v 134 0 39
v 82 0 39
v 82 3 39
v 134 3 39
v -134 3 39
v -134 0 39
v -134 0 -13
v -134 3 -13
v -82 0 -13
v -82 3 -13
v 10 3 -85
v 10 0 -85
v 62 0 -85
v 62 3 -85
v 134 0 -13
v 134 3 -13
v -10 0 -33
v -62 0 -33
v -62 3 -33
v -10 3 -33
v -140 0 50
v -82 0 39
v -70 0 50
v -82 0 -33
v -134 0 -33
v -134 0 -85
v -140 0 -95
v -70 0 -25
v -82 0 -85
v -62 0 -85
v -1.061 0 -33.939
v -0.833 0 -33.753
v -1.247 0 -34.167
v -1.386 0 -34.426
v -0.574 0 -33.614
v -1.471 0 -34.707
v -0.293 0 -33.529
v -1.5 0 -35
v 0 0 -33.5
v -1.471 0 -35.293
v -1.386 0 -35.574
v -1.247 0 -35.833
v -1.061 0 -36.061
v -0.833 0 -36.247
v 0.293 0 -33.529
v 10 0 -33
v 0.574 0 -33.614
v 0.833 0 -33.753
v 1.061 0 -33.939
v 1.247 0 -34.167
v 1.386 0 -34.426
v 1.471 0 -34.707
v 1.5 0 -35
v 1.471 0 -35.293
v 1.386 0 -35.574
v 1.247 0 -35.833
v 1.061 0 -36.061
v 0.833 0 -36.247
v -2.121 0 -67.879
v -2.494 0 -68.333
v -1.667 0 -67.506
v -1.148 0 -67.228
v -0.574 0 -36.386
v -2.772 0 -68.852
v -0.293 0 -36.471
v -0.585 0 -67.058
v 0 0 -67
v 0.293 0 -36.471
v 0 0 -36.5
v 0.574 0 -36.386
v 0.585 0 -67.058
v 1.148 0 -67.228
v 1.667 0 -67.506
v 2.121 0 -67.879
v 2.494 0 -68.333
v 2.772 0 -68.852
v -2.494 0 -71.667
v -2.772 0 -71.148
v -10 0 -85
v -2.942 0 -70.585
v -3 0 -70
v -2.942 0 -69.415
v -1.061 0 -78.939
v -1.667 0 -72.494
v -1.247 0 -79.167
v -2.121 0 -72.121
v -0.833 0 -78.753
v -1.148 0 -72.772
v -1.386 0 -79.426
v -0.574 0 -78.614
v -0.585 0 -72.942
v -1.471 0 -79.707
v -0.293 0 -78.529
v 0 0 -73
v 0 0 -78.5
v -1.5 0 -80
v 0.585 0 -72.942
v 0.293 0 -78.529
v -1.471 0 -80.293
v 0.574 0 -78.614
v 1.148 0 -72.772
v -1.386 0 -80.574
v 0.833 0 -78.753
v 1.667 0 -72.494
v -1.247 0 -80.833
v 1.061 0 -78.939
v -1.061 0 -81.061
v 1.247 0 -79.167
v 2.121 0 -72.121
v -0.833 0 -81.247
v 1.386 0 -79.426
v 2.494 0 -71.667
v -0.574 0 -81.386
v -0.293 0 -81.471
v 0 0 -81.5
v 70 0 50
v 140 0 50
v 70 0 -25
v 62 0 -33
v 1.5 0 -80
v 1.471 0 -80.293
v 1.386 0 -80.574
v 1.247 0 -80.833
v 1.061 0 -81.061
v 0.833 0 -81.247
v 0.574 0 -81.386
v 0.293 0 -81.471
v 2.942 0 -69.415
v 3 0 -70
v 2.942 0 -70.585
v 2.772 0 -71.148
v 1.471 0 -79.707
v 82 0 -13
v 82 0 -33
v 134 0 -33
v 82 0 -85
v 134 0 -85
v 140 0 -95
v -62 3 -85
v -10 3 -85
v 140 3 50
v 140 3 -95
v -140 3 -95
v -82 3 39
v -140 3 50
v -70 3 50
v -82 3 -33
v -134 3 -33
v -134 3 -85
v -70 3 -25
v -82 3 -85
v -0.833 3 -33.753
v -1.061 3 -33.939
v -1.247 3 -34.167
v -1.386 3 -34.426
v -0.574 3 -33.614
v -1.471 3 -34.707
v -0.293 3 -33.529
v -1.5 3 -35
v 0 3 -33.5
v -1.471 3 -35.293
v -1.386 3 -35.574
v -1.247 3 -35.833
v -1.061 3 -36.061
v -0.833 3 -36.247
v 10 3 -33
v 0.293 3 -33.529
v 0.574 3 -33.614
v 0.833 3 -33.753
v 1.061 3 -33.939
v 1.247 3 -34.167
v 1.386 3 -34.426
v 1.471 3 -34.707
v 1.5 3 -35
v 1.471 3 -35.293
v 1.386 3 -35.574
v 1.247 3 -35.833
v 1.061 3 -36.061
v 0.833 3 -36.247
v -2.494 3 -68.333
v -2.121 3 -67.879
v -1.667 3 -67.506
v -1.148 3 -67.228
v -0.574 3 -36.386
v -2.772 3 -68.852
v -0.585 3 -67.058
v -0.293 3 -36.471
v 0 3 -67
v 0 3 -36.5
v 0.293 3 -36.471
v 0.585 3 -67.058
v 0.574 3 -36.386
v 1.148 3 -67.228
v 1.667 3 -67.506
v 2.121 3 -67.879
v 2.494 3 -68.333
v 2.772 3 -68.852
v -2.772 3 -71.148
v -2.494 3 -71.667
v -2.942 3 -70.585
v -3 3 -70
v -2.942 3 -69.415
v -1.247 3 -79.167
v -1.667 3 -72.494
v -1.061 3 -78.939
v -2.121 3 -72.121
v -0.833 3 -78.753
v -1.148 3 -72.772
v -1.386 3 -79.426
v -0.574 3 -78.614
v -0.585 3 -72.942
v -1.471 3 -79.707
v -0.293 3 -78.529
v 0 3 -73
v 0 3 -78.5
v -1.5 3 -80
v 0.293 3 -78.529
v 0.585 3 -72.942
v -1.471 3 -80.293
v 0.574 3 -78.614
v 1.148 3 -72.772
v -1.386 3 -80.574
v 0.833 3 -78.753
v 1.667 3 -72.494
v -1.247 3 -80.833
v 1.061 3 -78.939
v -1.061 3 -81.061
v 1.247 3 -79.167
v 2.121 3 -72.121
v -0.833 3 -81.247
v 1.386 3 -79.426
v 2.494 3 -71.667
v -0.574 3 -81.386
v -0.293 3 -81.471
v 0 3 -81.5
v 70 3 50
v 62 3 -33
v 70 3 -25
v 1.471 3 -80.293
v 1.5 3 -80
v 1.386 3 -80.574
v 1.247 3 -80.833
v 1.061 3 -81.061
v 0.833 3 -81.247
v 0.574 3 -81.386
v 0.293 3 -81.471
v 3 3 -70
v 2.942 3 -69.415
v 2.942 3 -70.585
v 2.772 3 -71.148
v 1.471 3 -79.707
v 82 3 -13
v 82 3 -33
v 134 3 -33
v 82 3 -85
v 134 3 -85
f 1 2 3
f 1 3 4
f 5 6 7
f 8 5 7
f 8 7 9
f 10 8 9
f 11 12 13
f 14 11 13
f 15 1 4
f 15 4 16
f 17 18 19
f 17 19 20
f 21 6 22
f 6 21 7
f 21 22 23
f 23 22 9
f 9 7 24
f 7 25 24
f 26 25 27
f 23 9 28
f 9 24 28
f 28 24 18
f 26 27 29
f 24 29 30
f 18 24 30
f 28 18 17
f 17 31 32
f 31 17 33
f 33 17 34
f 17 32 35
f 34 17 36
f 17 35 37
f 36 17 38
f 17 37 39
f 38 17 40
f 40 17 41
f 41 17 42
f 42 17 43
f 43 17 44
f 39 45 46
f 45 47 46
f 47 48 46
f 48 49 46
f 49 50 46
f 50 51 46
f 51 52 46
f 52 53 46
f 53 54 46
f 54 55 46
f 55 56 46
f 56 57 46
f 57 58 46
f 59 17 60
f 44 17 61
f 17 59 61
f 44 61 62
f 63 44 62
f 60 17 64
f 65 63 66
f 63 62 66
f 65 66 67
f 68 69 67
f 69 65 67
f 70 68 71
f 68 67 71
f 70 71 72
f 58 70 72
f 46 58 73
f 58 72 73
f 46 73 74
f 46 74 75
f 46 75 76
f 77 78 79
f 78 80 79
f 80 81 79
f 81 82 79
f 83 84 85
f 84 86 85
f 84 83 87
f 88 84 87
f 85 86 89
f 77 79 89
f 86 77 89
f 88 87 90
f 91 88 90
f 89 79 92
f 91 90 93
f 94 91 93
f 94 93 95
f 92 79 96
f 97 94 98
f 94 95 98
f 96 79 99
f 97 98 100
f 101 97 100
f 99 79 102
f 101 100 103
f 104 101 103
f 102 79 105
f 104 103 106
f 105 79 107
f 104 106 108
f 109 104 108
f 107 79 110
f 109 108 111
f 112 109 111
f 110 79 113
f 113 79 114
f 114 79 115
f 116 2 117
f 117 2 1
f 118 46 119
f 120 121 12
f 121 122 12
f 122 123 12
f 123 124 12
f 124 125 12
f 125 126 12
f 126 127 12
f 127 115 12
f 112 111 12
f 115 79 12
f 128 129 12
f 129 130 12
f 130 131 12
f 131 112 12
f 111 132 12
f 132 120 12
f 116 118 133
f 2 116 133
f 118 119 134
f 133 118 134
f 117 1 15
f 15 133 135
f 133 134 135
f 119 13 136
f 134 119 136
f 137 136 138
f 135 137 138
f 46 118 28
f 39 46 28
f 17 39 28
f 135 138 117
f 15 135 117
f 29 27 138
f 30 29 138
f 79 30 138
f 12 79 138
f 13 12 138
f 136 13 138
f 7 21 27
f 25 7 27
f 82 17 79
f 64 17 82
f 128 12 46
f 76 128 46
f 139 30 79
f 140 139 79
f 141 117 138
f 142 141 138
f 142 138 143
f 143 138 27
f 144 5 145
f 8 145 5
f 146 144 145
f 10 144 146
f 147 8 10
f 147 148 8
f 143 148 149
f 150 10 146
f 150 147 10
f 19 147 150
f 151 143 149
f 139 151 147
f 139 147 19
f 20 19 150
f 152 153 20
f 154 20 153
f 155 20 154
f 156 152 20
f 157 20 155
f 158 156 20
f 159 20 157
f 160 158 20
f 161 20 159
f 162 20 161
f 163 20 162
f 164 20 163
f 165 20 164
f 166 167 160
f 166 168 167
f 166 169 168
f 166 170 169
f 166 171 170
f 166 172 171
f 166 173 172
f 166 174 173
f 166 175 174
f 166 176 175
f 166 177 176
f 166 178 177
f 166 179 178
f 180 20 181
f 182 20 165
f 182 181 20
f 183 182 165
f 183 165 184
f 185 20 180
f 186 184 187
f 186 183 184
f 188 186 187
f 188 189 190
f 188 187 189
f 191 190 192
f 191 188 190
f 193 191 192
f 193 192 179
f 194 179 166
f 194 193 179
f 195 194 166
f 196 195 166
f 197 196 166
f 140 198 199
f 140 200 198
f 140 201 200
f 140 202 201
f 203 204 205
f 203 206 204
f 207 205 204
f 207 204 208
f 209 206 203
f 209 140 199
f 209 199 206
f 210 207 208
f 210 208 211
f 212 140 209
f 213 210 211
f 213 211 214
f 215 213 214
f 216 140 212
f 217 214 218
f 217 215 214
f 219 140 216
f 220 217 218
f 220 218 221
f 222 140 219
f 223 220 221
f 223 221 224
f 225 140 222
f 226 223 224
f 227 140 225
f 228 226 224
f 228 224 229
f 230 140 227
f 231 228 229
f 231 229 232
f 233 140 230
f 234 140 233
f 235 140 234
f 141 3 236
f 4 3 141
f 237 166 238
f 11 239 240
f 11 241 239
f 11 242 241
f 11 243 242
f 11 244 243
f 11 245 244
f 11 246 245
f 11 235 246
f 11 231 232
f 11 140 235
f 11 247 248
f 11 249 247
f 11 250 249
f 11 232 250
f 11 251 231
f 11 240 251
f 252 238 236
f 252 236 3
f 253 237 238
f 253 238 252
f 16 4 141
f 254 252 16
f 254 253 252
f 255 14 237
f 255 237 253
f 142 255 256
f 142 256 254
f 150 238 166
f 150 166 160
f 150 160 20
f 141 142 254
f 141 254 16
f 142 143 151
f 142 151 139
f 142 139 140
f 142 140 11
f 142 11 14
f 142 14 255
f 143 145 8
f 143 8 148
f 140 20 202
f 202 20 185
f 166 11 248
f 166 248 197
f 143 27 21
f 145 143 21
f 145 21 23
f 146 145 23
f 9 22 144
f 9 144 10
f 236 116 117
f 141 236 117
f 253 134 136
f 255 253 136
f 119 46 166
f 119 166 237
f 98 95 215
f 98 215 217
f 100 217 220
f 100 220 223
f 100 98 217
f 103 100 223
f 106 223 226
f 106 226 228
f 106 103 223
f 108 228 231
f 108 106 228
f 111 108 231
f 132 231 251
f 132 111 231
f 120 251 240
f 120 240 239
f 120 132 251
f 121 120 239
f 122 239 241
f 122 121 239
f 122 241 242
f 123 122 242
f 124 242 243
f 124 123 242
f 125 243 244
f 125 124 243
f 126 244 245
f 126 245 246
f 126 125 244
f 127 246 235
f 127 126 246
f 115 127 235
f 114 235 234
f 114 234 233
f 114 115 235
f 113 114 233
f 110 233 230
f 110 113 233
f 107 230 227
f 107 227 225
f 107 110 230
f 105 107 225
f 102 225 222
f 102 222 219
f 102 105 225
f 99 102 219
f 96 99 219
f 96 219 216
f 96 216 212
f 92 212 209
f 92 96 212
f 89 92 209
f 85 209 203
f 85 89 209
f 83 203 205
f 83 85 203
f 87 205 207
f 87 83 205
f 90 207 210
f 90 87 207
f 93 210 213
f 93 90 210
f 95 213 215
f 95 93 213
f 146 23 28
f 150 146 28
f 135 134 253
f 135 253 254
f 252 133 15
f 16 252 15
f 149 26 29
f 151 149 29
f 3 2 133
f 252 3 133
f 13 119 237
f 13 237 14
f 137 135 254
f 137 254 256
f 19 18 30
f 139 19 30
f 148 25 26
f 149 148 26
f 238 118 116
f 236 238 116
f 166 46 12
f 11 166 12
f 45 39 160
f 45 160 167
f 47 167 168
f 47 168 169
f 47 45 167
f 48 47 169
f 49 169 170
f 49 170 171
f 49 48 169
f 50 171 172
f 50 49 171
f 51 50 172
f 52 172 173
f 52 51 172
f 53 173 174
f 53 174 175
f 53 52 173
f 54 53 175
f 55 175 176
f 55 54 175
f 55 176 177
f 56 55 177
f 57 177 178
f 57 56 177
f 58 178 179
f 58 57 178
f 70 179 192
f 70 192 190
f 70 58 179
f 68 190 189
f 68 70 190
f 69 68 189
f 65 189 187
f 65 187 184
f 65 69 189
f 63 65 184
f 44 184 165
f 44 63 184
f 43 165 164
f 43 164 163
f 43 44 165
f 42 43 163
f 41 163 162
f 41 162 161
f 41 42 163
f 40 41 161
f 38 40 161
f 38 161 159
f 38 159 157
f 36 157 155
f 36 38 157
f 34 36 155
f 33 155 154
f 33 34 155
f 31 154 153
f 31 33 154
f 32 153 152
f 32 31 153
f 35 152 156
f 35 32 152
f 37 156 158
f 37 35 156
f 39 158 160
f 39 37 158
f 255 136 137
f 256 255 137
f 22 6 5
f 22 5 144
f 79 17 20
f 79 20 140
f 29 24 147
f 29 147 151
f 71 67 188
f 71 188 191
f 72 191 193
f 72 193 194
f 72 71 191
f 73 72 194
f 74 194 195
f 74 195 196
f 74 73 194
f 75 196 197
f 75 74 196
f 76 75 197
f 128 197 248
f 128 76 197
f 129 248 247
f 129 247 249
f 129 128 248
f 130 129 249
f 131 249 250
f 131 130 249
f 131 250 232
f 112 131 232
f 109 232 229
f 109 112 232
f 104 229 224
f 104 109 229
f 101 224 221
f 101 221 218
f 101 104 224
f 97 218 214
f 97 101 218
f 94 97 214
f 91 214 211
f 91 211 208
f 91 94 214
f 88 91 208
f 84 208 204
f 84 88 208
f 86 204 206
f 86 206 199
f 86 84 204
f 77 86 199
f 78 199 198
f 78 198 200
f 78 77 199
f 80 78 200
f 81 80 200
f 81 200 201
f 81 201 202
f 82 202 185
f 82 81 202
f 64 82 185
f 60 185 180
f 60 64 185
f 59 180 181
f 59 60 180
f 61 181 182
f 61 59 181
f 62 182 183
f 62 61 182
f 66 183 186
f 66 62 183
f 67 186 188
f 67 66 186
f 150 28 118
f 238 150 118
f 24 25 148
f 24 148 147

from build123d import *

# Parameters (mm, degrees)
SKETCH_1_R      = 1.5
SKETCH_1_R_2    = 3
SKETCH_1_W      = 52
SKETCH_1_H      = 52
EXTRUDE_1_DEPTH = 3


with BuildPart() as part:
    # 草图1 → 凸台-拉伸1 (new body)
    with BuildSketch(Plane(origin=(0, 0, 0), x_dir=(1, 0, 0), z_dir=(0, 1, 0))):
        Polygon((-140, -50), (-70, -50), (-70, 25), (70, 25), (70, -50), (140, -50), (140, 95), (-140, 95), align=None)
        with Locations(Location((0, 80, 0), (0, 0, 270))):
            Circle(SKETCH_1_R, mode=Mode.SUBTRACT)
        with Locations(Location((0, 35, 0), (0, 0, 270))):
            Circle(SKETCH_1_R, mode=Mode.SUBTRACT)
        with Locations(Location((0, 70, 0), (0, 0, 270))):
            Circle(SKETCH_1_R_2, mode=Mode.SUBTRACT)
        with Locations((36, 59)):
            Rectangle(SKETCH_1_W, SKETCH_1_H, mode=Mode.SUBTRACT)
        with Locations((-36, 59)):
            Rectangle(SKETCH_1_W, SKETCH_1_H, mode=Mode.SUBTRACT)
        with Locations((-108, 59)):
            Rectangle(SKETCH_1_W, SKETCH_1_H, mode=Mode.SUBTRACT)
        with Locations((108, 59)):
            Rectangle(SKETCH_1_W, SKETCH_1_H, mode=Mode.SUBTRACT)
        with Locations((-108, -13)):
            Rectangle(SKETCH_1_W, SKETCH_1_H, mode=Mode.SUBTRACT)
        with Locations((108, -13)):
            Rectangle(SKETCH_1_W, SKETCH_1_H, mode=Mode.SUBTRACT)
    extrude(amount=EXTRUDE_1_DEPTH)


solid = part.part
